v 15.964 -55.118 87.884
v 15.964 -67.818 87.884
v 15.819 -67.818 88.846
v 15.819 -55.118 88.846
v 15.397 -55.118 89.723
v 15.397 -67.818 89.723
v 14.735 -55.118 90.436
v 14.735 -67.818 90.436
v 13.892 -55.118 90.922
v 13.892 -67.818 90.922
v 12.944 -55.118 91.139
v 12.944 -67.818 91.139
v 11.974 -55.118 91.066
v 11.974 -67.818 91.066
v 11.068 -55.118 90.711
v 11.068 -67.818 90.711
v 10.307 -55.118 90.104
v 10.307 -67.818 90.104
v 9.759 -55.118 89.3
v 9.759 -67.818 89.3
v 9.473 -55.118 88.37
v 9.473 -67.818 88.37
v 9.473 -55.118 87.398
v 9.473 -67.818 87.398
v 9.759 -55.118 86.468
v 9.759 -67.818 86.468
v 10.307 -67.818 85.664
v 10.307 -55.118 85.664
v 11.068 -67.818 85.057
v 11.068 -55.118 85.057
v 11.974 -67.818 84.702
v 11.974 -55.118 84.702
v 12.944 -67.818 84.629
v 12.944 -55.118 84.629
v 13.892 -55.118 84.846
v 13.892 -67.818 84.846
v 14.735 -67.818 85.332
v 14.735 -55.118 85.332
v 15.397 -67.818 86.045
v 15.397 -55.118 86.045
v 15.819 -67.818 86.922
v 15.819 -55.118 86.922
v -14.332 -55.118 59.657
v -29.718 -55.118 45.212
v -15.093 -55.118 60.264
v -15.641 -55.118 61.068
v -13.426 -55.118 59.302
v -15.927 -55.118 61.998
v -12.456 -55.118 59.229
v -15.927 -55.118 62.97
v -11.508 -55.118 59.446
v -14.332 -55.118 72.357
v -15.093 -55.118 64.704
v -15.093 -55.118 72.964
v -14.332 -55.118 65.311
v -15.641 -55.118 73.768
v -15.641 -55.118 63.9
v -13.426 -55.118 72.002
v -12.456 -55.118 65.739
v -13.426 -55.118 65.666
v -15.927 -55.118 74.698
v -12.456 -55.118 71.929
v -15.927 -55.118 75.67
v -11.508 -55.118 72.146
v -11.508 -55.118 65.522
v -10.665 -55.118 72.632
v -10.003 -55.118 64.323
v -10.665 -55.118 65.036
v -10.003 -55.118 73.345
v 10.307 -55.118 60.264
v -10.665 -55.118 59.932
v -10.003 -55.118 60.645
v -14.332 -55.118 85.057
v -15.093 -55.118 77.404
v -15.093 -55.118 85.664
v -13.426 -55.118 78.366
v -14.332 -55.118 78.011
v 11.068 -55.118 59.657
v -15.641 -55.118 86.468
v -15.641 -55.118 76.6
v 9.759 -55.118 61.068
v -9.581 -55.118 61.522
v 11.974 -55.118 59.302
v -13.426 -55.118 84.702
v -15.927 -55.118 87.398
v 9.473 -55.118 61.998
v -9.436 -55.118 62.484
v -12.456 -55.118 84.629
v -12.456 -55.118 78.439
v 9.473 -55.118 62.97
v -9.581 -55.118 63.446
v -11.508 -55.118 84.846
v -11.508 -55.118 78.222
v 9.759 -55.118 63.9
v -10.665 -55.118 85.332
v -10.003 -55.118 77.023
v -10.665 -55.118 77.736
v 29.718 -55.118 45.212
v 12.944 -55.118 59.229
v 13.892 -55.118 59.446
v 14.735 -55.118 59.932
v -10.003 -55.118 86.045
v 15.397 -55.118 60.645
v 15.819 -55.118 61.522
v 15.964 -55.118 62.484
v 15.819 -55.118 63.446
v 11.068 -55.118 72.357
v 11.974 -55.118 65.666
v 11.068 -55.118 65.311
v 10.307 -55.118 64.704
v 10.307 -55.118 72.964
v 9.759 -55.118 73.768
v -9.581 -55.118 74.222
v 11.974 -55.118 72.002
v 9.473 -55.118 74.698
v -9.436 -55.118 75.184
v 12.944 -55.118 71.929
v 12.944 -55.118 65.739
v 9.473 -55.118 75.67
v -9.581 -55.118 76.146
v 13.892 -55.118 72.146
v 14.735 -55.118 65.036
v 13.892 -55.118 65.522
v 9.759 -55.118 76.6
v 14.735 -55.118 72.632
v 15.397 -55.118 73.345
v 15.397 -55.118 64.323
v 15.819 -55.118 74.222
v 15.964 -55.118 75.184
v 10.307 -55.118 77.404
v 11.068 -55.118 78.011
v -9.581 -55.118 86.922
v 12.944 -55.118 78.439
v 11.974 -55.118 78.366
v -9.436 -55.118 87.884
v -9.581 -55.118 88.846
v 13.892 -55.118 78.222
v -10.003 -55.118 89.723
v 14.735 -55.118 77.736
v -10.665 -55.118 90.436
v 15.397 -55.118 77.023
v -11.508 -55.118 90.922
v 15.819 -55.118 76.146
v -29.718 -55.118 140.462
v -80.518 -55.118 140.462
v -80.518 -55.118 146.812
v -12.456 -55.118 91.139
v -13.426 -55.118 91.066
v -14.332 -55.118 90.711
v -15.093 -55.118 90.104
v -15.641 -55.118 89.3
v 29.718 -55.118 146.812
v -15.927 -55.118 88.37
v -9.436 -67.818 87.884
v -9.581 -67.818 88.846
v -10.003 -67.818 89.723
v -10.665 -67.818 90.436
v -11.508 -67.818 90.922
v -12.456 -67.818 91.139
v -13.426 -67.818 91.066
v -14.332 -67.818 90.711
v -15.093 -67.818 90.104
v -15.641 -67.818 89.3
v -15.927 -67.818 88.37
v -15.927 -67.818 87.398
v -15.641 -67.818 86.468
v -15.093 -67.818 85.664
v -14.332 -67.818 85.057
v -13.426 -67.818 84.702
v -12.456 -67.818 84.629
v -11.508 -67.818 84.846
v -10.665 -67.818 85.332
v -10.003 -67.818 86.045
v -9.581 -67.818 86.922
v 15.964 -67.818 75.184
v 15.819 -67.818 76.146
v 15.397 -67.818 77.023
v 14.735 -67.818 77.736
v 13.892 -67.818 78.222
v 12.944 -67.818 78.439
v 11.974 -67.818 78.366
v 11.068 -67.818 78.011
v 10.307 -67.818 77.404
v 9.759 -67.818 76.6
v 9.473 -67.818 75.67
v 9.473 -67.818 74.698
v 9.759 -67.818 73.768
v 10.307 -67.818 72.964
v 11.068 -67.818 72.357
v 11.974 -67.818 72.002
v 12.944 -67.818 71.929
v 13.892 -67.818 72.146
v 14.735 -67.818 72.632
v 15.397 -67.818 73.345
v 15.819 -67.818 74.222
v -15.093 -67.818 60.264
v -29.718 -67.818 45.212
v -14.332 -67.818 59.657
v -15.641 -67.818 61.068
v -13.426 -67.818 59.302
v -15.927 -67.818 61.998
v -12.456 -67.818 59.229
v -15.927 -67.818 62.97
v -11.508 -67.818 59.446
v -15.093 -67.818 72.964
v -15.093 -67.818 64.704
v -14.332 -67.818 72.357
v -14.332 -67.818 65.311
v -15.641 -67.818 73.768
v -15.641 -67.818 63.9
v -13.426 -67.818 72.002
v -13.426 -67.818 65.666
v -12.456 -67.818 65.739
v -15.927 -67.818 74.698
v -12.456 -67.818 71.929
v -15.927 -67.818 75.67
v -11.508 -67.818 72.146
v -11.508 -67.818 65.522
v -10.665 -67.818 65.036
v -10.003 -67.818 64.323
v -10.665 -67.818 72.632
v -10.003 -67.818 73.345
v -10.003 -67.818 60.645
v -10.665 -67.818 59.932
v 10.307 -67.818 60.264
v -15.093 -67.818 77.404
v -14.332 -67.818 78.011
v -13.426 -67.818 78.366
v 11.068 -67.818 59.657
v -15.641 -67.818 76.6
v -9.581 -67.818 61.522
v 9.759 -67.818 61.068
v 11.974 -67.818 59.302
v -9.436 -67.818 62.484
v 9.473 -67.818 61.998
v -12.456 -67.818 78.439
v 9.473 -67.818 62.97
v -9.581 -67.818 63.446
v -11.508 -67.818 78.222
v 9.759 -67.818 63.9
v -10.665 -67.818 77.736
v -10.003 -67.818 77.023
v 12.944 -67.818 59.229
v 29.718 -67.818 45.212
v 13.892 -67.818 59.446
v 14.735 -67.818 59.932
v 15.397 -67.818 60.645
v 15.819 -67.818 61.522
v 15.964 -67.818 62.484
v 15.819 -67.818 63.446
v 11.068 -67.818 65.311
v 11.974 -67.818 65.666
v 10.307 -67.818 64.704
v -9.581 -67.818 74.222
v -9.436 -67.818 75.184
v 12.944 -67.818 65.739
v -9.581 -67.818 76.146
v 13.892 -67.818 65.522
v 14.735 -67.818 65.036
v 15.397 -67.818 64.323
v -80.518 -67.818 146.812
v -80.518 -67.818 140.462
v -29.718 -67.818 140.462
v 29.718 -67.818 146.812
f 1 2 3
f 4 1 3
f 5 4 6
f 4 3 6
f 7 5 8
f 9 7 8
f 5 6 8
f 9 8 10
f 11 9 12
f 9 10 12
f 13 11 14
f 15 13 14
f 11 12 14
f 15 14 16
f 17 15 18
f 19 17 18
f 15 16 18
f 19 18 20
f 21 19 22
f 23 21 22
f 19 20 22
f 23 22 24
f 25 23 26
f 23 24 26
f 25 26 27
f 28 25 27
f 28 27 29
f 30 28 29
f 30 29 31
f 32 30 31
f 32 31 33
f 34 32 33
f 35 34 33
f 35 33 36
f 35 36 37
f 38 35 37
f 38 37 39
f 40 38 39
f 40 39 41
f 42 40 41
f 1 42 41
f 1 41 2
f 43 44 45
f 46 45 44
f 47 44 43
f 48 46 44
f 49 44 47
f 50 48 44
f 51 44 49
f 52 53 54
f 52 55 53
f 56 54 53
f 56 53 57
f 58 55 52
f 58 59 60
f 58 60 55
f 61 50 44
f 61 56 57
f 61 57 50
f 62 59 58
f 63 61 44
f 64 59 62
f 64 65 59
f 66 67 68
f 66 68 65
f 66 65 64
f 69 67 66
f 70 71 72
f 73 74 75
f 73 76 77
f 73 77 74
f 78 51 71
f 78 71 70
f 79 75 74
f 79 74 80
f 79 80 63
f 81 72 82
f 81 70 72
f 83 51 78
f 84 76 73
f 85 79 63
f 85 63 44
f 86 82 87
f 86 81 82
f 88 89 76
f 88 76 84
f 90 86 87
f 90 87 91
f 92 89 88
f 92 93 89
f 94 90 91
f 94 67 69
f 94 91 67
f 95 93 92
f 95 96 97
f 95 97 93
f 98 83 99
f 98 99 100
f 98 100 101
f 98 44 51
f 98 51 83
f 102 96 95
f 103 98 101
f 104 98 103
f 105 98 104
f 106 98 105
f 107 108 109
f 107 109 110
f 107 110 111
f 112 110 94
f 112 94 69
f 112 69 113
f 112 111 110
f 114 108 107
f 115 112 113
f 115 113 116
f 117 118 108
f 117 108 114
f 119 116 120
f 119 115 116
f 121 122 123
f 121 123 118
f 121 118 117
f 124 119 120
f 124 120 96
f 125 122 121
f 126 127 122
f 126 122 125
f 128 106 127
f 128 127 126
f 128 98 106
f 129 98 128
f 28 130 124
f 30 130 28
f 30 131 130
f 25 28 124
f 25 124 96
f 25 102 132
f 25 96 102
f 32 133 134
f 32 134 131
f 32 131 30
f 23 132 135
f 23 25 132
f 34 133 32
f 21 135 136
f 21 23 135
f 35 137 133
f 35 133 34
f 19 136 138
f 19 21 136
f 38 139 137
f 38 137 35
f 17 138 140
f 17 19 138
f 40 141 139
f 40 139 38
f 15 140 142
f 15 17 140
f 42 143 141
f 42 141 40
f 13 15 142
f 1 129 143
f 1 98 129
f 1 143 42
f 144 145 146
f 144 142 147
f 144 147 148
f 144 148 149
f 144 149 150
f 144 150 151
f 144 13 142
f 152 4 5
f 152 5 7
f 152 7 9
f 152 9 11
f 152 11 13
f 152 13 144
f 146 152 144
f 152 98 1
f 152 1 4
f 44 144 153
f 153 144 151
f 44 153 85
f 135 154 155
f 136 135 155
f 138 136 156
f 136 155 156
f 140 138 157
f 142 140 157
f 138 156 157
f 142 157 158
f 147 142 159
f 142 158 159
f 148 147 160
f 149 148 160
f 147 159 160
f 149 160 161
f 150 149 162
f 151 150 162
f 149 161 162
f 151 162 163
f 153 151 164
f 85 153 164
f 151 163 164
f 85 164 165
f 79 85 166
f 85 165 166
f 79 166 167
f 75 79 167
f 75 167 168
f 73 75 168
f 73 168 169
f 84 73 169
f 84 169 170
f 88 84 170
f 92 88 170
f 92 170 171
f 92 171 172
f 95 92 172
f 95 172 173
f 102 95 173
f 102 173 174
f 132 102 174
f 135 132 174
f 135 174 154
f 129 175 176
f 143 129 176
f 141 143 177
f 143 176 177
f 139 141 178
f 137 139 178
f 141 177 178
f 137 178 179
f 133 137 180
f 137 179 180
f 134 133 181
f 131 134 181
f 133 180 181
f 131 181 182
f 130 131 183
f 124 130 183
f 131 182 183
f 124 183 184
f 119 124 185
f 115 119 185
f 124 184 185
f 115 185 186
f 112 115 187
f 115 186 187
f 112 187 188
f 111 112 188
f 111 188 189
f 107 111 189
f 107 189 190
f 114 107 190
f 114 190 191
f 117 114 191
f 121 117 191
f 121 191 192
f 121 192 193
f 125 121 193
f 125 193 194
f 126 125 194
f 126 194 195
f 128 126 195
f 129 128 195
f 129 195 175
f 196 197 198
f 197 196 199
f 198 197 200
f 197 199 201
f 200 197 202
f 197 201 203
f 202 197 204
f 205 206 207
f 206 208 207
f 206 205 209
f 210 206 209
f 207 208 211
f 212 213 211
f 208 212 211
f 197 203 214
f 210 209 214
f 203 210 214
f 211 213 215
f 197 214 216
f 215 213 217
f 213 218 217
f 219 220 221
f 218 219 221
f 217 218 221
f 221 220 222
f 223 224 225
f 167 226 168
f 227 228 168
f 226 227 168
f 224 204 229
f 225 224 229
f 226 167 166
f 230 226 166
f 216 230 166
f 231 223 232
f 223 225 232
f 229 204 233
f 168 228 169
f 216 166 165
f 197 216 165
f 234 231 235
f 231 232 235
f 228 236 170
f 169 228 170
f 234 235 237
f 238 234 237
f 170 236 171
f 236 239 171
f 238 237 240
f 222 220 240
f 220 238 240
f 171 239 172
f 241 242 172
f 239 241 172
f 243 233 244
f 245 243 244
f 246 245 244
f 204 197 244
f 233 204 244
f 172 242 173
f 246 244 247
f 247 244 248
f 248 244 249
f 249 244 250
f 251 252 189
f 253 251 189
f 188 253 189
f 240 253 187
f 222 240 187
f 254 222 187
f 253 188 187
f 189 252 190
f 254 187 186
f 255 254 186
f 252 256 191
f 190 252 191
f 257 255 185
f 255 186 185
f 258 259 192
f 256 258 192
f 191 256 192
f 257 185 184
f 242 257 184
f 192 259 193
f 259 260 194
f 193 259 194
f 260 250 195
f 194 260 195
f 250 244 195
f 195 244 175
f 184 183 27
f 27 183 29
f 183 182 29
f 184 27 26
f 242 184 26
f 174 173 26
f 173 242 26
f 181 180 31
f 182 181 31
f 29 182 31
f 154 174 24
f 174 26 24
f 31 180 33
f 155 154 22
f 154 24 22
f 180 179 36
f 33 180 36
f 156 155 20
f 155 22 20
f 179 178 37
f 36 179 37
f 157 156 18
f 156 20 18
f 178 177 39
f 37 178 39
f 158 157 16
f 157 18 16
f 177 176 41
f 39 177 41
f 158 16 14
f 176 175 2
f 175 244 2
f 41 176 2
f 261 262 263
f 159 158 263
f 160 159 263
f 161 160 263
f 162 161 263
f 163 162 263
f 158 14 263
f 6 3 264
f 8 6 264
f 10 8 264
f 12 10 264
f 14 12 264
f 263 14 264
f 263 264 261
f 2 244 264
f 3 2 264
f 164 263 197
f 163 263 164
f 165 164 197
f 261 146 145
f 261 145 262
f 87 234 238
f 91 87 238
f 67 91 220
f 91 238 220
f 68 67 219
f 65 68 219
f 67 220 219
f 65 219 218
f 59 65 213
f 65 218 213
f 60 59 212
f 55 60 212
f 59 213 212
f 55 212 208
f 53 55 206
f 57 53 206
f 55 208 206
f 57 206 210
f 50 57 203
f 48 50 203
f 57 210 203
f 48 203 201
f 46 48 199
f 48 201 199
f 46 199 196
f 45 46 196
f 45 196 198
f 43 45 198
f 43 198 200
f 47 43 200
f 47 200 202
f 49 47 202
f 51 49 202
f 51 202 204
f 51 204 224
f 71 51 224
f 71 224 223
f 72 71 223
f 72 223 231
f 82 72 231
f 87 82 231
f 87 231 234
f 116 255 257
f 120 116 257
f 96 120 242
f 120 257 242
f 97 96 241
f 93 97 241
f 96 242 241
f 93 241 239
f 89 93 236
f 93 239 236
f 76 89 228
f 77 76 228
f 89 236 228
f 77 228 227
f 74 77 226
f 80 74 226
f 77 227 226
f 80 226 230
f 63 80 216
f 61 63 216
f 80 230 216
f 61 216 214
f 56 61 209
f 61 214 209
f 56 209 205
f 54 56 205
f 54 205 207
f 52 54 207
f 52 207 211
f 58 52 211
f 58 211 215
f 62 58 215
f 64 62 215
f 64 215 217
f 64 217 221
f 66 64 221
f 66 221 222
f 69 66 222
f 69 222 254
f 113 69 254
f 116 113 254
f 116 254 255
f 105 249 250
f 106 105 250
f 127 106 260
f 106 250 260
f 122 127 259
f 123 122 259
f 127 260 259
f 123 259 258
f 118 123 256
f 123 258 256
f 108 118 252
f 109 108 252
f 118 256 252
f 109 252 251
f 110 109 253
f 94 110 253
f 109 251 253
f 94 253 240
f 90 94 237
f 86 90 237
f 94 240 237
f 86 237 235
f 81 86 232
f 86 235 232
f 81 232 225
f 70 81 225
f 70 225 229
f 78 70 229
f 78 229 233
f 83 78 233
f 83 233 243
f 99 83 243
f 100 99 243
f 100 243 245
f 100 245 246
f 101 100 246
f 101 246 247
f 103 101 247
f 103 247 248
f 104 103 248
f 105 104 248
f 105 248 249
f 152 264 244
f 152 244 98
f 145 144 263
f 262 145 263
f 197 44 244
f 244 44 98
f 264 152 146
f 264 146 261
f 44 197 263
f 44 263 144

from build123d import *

# Parameters (mm, degrees)
SKETCH024_W        = 59.436
SKETCH024_H        = 12.7
PAD003003_DEPTH    = 101.6
SKETCH026_R        = 3.2639
POCKET001003_DEPTH = 12.701
SKETCH025_W        = 12.7
SKETCH025_H        = 6.35
PAD003004_DEPTH    = 50.8


with BuildPart() as part:
    # Sketch024 → Pad003003 (new body)
    with BuildSketch(Plane.XY.offset(45.212)):
        with Locations((0, -61.468)):
            Rectangle(SKETCH024_W, SKETCH024_H)
    extrude(amount=PAD003003_DEPTH)

    # Sketch026 (on Face1 of Pad003003) → Pocket001003 (cut, through all)
    with BuildSketch(Plane(origin=(0, -67.818, 45.212), x_dir=(1, 0, 0), z_dir=(0, -1, 0))):
        with Locations((-12.7, 17.272)):
            Circle(SKETCH026_R)
        with Locations((-12.7, 29.972)):
            Circle(SKETCH026_R)
        with Locations((-12.7, 42.672)):
            Circle(SKETCH026_R)
        with Locations((12.7, 17.272)):
            Circle(SKETCH026_R)
        with Locations((12.7, 29.972)):
            Circle(SKETCH026_R)
        with Locations((12.7, 42.672)):
            Circle(SKETCH026_R)
    extrude(amount=-POCKET001003_DEPTH, mode=Mode.SUBTRACT)

    # Sketch025 (on Face5 of Pocket001003) → Pad003004 (join)
    with BuildSketch(Plane(origin=(-29.718, 0, 45.212), x_dir=(0, -1, 0), z_dir=(-1, 0, 0))):
        with Locations((61.468, 98.425)):
            Rectangle(SKETCH025_W, SKETCH025_H)
    extrude(amount=PAD003004_DEPTH)


solid = part.part
